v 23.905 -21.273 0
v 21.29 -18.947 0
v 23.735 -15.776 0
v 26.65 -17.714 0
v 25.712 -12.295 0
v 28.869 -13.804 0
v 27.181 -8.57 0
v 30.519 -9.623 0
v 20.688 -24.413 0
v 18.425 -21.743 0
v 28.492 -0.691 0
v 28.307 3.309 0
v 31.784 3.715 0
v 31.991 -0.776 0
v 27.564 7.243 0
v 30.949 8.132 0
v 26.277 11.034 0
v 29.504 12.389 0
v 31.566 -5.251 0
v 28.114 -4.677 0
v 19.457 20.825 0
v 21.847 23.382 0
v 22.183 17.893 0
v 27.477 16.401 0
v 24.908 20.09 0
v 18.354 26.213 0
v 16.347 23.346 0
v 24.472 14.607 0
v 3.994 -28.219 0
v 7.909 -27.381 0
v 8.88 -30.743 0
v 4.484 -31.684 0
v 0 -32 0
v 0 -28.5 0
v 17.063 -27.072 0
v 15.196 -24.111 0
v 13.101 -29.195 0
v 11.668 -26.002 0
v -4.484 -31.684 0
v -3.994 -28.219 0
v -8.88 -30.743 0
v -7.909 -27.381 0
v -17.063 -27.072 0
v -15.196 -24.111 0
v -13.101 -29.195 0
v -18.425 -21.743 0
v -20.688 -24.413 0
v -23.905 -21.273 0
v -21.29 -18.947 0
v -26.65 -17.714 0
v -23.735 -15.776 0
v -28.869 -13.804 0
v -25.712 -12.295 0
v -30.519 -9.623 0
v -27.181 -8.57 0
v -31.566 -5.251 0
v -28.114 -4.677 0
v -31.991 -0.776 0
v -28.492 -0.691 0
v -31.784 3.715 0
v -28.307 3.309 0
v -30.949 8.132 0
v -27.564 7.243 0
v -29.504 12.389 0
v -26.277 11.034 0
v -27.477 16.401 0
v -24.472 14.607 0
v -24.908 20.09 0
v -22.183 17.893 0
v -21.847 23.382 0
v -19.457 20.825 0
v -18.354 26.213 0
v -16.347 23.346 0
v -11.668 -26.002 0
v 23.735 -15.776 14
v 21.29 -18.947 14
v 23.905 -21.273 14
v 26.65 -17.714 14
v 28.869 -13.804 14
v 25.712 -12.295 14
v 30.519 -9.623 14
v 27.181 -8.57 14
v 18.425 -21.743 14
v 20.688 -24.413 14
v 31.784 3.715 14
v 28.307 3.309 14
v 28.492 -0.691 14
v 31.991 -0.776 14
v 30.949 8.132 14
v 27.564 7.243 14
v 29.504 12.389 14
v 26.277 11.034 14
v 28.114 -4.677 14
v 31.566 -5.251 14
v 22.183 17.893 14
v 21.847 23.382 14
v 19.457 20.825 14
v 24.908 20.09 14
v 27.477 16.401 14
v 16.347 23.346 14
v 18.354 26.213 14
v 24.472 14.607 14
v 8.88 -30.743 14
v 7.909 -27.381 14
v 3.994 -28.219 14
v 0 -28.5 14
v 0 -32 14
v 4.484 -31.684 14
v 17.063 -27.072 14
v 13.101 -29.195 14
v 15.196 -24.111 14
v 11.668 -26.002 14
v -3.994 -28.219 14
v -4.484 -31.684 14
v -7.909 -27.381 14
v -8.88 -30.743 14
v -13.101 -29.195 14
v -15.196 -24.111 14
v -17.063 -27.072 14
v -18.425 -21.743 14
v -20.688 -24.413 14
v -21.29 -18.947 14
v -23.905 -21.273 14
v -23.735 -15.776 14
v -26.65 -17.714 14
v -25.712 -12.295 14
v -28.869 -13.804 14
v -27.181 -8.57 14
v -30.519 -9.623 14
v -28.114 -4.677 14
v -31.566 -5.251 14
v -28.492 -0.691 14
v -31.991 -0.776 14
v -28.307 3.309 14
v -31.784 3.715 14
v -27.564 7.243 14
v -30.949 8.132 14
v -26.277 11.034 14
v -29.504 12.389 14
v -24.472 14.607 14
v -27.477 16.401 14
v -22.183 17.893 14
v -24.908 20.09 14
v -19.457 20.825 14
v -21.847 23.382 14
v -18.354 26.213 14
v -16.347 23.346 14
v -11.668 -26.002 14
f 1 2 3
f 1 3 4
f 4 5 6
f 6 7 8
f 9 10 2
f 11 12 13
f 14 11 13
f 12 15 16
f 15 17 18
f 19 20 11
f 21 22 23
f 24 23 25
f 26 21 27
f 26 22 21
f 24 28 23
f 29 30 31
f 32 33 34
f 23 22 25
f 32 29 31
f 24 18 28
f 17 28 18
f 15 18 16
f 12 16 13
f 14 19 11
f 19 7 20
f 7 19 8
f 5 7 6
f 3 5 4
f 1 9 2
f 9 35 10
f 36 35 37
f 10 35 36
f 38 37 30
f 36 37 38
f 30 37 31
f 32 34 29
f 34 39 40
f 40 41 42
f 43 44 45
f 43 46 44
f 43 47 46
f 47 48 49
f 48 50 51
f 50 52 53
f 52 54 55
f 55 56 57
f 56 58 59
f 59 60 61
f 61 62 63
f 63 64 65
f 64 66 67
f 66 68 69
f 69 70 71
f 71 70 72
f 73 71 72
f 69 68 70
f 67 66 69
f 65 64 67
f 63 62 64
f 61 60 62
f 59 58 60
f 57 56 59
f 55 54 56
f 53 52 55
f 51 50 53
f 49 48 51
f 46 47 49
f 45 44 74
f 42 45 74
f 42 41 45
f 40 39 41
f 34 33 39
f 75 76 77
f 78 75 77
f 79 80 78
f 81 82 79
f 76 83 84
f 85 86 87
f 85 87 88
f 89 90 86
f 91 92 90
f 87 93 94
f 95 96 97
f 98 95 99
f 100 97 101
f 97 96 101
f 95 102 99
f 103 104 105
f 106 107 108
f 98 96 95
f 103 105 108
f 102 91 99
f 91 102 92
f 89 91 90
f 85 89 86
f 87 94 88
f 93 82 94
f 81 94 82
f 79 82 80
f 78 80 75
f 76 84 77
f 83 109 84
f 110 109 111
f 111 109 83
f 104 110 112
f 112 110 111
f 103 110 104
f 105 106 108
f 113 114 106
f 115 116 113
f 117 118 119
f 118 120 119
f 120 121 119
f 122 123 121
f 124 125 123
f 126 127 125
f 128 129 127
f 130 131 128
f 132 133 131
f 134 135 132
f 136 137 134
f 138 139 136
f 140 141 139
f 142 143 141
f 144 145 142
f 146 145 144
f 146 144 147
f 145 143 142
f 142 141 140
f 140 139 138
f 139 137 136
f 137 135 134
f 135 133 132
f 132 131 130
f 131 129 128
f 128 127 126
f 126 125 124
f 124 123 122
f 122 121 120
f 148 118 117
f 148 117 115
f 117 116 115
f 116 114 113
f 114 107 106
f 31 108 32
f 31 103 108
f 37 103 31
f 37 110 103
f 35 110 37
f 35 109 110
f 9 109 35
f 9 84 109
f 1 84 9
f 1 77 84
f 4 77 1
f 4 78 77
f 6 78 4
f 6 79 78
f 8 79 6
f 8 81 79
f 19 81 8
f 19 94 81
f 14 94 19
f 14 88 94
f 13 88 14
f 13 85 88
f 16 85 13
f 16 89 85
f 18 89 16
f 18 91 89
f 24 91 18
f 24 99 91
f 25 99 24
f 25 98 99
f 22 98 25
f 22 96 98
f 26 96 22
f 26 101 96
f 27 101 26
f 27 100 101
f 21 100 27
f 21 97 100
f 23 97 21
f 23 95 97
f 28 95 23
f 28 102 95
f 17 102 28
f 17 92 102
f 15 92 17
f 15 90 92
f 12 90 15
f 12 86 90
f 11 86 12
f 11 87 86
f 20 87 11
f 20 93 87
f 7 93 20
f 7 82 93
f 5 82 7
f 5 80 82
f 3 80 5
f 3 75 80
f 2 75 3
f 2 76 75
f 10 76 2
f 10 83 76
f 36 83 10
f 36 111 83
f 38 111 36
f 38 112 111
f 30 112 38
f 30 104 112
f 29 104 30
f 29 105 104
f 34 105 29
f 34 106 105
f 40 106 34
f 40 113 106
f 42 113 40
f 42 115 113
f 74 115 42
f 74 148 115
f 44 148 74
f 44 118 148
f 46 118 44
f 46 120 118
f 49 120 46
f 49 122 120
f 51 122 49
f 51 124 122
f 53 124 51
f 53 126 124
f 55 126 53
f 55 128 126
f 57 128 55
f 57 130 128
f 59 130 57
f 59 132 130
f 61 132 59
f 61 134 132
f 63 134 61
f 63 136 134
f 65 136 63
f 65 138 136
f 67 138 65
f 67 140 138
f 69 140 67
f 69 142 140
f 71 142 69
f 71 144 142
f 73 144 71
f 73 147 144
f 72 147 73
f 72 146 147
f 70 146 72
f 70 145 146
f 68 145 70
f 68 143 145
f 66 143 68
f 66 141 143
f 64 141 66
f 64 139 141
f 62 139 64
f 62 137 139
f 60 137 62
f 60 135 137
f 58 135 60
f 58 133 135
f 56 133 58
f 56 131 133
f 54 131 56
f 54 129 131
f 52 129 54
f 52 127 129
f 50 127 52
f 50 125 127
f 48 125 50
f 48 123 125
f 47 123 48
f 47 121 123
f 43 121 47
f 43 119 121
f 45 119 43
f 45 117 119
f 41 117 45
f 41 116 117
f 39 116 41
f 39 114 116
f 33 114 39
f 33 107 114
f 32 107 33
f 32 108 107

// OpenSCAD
$fn = 32;

// ----------------------------------------------------------------------
// Spring clip: 64 mm outside, 3.5 mm band, 70 degree opening
// ----------------------------------------------------------------------

// --- parameters (mm) ---
outer_r = 32;             // clip outside radius
inner_r = 28.5;           // clip bore radius
band = 3.5;               // band thickness
clip_w = 14;              // clip width
opening = 70;             // opening angle

clip_profile = [[-18.354, 26.213], [-21.847, 23.382], [-24.908, 20.09], [-27.477, 16.401], [-29.504, 12.389], [-30.949, 8.132], [-31.784, 3.715], [-31.991, -0.776], [-31.566, -5.251], [-30.519, -9.623], [-28.869, -13.804], [-26.65, -17.714], [-23.905, -21.273], [-20.688, -24.413], [-17.063, -27.072], [-13.101, -29.195], [-8.88, -30.743], [-4.484, -31.684], [0, -32], [4.484, -31.684], [8.88, -30.743], [13.101, -29.195], [17.063, -27.072], [20.688, -24.413], [23.905, -21.273], [26.65, -17.714], [28.869, -13.804], [30.519, -9.623], [31.566, -5.251], [31.991, -0.776], [31.784, 3.715], [30.949, 8.132], [29.504, 12.389], [27.477, 16.401], [24.908, 20.09], [21.847, 23.382], [18.354, 26.213], [16.347, 23.346], [19.457, 20.825], [22.183, 17.893], [24.472, 14.607], [26.277, 11.034], [27.564, 7.243], [28.307, 3.309], [28.492, -0.691], [28.114, -4.677], [27.181, -8.57], [25.712, -12.295], [23.735, -15.776], [21.29, -18.947], [18.425, -21.743], [15.196, -24.111], [11.668, -26.002], [7.909, -27.381], [3.994, -28.219], [0, -28.5], [-3.994, -28.219], [-7.909, -27.381], [-11.668, -26.002], [-15.196, -24.111], [-18.425, -21.743], [-21.29, -18.947], [-23.735, -15.776], [-25.712, -12.295], [-27.181, -8.57], [-28.114, -4.677], [-28.492, -0.691], [-28.307, 3.309], [-27.564, 7.243], [-26.277, 11.034], [-24.472, 14.607], [-22.183, 17.893], [-19.457, 20.825], [-16.347, 23.346]];

difference() {
  union() {
    linear_extrude(height = clip_w) polygon(clip_profile);
  }
}
